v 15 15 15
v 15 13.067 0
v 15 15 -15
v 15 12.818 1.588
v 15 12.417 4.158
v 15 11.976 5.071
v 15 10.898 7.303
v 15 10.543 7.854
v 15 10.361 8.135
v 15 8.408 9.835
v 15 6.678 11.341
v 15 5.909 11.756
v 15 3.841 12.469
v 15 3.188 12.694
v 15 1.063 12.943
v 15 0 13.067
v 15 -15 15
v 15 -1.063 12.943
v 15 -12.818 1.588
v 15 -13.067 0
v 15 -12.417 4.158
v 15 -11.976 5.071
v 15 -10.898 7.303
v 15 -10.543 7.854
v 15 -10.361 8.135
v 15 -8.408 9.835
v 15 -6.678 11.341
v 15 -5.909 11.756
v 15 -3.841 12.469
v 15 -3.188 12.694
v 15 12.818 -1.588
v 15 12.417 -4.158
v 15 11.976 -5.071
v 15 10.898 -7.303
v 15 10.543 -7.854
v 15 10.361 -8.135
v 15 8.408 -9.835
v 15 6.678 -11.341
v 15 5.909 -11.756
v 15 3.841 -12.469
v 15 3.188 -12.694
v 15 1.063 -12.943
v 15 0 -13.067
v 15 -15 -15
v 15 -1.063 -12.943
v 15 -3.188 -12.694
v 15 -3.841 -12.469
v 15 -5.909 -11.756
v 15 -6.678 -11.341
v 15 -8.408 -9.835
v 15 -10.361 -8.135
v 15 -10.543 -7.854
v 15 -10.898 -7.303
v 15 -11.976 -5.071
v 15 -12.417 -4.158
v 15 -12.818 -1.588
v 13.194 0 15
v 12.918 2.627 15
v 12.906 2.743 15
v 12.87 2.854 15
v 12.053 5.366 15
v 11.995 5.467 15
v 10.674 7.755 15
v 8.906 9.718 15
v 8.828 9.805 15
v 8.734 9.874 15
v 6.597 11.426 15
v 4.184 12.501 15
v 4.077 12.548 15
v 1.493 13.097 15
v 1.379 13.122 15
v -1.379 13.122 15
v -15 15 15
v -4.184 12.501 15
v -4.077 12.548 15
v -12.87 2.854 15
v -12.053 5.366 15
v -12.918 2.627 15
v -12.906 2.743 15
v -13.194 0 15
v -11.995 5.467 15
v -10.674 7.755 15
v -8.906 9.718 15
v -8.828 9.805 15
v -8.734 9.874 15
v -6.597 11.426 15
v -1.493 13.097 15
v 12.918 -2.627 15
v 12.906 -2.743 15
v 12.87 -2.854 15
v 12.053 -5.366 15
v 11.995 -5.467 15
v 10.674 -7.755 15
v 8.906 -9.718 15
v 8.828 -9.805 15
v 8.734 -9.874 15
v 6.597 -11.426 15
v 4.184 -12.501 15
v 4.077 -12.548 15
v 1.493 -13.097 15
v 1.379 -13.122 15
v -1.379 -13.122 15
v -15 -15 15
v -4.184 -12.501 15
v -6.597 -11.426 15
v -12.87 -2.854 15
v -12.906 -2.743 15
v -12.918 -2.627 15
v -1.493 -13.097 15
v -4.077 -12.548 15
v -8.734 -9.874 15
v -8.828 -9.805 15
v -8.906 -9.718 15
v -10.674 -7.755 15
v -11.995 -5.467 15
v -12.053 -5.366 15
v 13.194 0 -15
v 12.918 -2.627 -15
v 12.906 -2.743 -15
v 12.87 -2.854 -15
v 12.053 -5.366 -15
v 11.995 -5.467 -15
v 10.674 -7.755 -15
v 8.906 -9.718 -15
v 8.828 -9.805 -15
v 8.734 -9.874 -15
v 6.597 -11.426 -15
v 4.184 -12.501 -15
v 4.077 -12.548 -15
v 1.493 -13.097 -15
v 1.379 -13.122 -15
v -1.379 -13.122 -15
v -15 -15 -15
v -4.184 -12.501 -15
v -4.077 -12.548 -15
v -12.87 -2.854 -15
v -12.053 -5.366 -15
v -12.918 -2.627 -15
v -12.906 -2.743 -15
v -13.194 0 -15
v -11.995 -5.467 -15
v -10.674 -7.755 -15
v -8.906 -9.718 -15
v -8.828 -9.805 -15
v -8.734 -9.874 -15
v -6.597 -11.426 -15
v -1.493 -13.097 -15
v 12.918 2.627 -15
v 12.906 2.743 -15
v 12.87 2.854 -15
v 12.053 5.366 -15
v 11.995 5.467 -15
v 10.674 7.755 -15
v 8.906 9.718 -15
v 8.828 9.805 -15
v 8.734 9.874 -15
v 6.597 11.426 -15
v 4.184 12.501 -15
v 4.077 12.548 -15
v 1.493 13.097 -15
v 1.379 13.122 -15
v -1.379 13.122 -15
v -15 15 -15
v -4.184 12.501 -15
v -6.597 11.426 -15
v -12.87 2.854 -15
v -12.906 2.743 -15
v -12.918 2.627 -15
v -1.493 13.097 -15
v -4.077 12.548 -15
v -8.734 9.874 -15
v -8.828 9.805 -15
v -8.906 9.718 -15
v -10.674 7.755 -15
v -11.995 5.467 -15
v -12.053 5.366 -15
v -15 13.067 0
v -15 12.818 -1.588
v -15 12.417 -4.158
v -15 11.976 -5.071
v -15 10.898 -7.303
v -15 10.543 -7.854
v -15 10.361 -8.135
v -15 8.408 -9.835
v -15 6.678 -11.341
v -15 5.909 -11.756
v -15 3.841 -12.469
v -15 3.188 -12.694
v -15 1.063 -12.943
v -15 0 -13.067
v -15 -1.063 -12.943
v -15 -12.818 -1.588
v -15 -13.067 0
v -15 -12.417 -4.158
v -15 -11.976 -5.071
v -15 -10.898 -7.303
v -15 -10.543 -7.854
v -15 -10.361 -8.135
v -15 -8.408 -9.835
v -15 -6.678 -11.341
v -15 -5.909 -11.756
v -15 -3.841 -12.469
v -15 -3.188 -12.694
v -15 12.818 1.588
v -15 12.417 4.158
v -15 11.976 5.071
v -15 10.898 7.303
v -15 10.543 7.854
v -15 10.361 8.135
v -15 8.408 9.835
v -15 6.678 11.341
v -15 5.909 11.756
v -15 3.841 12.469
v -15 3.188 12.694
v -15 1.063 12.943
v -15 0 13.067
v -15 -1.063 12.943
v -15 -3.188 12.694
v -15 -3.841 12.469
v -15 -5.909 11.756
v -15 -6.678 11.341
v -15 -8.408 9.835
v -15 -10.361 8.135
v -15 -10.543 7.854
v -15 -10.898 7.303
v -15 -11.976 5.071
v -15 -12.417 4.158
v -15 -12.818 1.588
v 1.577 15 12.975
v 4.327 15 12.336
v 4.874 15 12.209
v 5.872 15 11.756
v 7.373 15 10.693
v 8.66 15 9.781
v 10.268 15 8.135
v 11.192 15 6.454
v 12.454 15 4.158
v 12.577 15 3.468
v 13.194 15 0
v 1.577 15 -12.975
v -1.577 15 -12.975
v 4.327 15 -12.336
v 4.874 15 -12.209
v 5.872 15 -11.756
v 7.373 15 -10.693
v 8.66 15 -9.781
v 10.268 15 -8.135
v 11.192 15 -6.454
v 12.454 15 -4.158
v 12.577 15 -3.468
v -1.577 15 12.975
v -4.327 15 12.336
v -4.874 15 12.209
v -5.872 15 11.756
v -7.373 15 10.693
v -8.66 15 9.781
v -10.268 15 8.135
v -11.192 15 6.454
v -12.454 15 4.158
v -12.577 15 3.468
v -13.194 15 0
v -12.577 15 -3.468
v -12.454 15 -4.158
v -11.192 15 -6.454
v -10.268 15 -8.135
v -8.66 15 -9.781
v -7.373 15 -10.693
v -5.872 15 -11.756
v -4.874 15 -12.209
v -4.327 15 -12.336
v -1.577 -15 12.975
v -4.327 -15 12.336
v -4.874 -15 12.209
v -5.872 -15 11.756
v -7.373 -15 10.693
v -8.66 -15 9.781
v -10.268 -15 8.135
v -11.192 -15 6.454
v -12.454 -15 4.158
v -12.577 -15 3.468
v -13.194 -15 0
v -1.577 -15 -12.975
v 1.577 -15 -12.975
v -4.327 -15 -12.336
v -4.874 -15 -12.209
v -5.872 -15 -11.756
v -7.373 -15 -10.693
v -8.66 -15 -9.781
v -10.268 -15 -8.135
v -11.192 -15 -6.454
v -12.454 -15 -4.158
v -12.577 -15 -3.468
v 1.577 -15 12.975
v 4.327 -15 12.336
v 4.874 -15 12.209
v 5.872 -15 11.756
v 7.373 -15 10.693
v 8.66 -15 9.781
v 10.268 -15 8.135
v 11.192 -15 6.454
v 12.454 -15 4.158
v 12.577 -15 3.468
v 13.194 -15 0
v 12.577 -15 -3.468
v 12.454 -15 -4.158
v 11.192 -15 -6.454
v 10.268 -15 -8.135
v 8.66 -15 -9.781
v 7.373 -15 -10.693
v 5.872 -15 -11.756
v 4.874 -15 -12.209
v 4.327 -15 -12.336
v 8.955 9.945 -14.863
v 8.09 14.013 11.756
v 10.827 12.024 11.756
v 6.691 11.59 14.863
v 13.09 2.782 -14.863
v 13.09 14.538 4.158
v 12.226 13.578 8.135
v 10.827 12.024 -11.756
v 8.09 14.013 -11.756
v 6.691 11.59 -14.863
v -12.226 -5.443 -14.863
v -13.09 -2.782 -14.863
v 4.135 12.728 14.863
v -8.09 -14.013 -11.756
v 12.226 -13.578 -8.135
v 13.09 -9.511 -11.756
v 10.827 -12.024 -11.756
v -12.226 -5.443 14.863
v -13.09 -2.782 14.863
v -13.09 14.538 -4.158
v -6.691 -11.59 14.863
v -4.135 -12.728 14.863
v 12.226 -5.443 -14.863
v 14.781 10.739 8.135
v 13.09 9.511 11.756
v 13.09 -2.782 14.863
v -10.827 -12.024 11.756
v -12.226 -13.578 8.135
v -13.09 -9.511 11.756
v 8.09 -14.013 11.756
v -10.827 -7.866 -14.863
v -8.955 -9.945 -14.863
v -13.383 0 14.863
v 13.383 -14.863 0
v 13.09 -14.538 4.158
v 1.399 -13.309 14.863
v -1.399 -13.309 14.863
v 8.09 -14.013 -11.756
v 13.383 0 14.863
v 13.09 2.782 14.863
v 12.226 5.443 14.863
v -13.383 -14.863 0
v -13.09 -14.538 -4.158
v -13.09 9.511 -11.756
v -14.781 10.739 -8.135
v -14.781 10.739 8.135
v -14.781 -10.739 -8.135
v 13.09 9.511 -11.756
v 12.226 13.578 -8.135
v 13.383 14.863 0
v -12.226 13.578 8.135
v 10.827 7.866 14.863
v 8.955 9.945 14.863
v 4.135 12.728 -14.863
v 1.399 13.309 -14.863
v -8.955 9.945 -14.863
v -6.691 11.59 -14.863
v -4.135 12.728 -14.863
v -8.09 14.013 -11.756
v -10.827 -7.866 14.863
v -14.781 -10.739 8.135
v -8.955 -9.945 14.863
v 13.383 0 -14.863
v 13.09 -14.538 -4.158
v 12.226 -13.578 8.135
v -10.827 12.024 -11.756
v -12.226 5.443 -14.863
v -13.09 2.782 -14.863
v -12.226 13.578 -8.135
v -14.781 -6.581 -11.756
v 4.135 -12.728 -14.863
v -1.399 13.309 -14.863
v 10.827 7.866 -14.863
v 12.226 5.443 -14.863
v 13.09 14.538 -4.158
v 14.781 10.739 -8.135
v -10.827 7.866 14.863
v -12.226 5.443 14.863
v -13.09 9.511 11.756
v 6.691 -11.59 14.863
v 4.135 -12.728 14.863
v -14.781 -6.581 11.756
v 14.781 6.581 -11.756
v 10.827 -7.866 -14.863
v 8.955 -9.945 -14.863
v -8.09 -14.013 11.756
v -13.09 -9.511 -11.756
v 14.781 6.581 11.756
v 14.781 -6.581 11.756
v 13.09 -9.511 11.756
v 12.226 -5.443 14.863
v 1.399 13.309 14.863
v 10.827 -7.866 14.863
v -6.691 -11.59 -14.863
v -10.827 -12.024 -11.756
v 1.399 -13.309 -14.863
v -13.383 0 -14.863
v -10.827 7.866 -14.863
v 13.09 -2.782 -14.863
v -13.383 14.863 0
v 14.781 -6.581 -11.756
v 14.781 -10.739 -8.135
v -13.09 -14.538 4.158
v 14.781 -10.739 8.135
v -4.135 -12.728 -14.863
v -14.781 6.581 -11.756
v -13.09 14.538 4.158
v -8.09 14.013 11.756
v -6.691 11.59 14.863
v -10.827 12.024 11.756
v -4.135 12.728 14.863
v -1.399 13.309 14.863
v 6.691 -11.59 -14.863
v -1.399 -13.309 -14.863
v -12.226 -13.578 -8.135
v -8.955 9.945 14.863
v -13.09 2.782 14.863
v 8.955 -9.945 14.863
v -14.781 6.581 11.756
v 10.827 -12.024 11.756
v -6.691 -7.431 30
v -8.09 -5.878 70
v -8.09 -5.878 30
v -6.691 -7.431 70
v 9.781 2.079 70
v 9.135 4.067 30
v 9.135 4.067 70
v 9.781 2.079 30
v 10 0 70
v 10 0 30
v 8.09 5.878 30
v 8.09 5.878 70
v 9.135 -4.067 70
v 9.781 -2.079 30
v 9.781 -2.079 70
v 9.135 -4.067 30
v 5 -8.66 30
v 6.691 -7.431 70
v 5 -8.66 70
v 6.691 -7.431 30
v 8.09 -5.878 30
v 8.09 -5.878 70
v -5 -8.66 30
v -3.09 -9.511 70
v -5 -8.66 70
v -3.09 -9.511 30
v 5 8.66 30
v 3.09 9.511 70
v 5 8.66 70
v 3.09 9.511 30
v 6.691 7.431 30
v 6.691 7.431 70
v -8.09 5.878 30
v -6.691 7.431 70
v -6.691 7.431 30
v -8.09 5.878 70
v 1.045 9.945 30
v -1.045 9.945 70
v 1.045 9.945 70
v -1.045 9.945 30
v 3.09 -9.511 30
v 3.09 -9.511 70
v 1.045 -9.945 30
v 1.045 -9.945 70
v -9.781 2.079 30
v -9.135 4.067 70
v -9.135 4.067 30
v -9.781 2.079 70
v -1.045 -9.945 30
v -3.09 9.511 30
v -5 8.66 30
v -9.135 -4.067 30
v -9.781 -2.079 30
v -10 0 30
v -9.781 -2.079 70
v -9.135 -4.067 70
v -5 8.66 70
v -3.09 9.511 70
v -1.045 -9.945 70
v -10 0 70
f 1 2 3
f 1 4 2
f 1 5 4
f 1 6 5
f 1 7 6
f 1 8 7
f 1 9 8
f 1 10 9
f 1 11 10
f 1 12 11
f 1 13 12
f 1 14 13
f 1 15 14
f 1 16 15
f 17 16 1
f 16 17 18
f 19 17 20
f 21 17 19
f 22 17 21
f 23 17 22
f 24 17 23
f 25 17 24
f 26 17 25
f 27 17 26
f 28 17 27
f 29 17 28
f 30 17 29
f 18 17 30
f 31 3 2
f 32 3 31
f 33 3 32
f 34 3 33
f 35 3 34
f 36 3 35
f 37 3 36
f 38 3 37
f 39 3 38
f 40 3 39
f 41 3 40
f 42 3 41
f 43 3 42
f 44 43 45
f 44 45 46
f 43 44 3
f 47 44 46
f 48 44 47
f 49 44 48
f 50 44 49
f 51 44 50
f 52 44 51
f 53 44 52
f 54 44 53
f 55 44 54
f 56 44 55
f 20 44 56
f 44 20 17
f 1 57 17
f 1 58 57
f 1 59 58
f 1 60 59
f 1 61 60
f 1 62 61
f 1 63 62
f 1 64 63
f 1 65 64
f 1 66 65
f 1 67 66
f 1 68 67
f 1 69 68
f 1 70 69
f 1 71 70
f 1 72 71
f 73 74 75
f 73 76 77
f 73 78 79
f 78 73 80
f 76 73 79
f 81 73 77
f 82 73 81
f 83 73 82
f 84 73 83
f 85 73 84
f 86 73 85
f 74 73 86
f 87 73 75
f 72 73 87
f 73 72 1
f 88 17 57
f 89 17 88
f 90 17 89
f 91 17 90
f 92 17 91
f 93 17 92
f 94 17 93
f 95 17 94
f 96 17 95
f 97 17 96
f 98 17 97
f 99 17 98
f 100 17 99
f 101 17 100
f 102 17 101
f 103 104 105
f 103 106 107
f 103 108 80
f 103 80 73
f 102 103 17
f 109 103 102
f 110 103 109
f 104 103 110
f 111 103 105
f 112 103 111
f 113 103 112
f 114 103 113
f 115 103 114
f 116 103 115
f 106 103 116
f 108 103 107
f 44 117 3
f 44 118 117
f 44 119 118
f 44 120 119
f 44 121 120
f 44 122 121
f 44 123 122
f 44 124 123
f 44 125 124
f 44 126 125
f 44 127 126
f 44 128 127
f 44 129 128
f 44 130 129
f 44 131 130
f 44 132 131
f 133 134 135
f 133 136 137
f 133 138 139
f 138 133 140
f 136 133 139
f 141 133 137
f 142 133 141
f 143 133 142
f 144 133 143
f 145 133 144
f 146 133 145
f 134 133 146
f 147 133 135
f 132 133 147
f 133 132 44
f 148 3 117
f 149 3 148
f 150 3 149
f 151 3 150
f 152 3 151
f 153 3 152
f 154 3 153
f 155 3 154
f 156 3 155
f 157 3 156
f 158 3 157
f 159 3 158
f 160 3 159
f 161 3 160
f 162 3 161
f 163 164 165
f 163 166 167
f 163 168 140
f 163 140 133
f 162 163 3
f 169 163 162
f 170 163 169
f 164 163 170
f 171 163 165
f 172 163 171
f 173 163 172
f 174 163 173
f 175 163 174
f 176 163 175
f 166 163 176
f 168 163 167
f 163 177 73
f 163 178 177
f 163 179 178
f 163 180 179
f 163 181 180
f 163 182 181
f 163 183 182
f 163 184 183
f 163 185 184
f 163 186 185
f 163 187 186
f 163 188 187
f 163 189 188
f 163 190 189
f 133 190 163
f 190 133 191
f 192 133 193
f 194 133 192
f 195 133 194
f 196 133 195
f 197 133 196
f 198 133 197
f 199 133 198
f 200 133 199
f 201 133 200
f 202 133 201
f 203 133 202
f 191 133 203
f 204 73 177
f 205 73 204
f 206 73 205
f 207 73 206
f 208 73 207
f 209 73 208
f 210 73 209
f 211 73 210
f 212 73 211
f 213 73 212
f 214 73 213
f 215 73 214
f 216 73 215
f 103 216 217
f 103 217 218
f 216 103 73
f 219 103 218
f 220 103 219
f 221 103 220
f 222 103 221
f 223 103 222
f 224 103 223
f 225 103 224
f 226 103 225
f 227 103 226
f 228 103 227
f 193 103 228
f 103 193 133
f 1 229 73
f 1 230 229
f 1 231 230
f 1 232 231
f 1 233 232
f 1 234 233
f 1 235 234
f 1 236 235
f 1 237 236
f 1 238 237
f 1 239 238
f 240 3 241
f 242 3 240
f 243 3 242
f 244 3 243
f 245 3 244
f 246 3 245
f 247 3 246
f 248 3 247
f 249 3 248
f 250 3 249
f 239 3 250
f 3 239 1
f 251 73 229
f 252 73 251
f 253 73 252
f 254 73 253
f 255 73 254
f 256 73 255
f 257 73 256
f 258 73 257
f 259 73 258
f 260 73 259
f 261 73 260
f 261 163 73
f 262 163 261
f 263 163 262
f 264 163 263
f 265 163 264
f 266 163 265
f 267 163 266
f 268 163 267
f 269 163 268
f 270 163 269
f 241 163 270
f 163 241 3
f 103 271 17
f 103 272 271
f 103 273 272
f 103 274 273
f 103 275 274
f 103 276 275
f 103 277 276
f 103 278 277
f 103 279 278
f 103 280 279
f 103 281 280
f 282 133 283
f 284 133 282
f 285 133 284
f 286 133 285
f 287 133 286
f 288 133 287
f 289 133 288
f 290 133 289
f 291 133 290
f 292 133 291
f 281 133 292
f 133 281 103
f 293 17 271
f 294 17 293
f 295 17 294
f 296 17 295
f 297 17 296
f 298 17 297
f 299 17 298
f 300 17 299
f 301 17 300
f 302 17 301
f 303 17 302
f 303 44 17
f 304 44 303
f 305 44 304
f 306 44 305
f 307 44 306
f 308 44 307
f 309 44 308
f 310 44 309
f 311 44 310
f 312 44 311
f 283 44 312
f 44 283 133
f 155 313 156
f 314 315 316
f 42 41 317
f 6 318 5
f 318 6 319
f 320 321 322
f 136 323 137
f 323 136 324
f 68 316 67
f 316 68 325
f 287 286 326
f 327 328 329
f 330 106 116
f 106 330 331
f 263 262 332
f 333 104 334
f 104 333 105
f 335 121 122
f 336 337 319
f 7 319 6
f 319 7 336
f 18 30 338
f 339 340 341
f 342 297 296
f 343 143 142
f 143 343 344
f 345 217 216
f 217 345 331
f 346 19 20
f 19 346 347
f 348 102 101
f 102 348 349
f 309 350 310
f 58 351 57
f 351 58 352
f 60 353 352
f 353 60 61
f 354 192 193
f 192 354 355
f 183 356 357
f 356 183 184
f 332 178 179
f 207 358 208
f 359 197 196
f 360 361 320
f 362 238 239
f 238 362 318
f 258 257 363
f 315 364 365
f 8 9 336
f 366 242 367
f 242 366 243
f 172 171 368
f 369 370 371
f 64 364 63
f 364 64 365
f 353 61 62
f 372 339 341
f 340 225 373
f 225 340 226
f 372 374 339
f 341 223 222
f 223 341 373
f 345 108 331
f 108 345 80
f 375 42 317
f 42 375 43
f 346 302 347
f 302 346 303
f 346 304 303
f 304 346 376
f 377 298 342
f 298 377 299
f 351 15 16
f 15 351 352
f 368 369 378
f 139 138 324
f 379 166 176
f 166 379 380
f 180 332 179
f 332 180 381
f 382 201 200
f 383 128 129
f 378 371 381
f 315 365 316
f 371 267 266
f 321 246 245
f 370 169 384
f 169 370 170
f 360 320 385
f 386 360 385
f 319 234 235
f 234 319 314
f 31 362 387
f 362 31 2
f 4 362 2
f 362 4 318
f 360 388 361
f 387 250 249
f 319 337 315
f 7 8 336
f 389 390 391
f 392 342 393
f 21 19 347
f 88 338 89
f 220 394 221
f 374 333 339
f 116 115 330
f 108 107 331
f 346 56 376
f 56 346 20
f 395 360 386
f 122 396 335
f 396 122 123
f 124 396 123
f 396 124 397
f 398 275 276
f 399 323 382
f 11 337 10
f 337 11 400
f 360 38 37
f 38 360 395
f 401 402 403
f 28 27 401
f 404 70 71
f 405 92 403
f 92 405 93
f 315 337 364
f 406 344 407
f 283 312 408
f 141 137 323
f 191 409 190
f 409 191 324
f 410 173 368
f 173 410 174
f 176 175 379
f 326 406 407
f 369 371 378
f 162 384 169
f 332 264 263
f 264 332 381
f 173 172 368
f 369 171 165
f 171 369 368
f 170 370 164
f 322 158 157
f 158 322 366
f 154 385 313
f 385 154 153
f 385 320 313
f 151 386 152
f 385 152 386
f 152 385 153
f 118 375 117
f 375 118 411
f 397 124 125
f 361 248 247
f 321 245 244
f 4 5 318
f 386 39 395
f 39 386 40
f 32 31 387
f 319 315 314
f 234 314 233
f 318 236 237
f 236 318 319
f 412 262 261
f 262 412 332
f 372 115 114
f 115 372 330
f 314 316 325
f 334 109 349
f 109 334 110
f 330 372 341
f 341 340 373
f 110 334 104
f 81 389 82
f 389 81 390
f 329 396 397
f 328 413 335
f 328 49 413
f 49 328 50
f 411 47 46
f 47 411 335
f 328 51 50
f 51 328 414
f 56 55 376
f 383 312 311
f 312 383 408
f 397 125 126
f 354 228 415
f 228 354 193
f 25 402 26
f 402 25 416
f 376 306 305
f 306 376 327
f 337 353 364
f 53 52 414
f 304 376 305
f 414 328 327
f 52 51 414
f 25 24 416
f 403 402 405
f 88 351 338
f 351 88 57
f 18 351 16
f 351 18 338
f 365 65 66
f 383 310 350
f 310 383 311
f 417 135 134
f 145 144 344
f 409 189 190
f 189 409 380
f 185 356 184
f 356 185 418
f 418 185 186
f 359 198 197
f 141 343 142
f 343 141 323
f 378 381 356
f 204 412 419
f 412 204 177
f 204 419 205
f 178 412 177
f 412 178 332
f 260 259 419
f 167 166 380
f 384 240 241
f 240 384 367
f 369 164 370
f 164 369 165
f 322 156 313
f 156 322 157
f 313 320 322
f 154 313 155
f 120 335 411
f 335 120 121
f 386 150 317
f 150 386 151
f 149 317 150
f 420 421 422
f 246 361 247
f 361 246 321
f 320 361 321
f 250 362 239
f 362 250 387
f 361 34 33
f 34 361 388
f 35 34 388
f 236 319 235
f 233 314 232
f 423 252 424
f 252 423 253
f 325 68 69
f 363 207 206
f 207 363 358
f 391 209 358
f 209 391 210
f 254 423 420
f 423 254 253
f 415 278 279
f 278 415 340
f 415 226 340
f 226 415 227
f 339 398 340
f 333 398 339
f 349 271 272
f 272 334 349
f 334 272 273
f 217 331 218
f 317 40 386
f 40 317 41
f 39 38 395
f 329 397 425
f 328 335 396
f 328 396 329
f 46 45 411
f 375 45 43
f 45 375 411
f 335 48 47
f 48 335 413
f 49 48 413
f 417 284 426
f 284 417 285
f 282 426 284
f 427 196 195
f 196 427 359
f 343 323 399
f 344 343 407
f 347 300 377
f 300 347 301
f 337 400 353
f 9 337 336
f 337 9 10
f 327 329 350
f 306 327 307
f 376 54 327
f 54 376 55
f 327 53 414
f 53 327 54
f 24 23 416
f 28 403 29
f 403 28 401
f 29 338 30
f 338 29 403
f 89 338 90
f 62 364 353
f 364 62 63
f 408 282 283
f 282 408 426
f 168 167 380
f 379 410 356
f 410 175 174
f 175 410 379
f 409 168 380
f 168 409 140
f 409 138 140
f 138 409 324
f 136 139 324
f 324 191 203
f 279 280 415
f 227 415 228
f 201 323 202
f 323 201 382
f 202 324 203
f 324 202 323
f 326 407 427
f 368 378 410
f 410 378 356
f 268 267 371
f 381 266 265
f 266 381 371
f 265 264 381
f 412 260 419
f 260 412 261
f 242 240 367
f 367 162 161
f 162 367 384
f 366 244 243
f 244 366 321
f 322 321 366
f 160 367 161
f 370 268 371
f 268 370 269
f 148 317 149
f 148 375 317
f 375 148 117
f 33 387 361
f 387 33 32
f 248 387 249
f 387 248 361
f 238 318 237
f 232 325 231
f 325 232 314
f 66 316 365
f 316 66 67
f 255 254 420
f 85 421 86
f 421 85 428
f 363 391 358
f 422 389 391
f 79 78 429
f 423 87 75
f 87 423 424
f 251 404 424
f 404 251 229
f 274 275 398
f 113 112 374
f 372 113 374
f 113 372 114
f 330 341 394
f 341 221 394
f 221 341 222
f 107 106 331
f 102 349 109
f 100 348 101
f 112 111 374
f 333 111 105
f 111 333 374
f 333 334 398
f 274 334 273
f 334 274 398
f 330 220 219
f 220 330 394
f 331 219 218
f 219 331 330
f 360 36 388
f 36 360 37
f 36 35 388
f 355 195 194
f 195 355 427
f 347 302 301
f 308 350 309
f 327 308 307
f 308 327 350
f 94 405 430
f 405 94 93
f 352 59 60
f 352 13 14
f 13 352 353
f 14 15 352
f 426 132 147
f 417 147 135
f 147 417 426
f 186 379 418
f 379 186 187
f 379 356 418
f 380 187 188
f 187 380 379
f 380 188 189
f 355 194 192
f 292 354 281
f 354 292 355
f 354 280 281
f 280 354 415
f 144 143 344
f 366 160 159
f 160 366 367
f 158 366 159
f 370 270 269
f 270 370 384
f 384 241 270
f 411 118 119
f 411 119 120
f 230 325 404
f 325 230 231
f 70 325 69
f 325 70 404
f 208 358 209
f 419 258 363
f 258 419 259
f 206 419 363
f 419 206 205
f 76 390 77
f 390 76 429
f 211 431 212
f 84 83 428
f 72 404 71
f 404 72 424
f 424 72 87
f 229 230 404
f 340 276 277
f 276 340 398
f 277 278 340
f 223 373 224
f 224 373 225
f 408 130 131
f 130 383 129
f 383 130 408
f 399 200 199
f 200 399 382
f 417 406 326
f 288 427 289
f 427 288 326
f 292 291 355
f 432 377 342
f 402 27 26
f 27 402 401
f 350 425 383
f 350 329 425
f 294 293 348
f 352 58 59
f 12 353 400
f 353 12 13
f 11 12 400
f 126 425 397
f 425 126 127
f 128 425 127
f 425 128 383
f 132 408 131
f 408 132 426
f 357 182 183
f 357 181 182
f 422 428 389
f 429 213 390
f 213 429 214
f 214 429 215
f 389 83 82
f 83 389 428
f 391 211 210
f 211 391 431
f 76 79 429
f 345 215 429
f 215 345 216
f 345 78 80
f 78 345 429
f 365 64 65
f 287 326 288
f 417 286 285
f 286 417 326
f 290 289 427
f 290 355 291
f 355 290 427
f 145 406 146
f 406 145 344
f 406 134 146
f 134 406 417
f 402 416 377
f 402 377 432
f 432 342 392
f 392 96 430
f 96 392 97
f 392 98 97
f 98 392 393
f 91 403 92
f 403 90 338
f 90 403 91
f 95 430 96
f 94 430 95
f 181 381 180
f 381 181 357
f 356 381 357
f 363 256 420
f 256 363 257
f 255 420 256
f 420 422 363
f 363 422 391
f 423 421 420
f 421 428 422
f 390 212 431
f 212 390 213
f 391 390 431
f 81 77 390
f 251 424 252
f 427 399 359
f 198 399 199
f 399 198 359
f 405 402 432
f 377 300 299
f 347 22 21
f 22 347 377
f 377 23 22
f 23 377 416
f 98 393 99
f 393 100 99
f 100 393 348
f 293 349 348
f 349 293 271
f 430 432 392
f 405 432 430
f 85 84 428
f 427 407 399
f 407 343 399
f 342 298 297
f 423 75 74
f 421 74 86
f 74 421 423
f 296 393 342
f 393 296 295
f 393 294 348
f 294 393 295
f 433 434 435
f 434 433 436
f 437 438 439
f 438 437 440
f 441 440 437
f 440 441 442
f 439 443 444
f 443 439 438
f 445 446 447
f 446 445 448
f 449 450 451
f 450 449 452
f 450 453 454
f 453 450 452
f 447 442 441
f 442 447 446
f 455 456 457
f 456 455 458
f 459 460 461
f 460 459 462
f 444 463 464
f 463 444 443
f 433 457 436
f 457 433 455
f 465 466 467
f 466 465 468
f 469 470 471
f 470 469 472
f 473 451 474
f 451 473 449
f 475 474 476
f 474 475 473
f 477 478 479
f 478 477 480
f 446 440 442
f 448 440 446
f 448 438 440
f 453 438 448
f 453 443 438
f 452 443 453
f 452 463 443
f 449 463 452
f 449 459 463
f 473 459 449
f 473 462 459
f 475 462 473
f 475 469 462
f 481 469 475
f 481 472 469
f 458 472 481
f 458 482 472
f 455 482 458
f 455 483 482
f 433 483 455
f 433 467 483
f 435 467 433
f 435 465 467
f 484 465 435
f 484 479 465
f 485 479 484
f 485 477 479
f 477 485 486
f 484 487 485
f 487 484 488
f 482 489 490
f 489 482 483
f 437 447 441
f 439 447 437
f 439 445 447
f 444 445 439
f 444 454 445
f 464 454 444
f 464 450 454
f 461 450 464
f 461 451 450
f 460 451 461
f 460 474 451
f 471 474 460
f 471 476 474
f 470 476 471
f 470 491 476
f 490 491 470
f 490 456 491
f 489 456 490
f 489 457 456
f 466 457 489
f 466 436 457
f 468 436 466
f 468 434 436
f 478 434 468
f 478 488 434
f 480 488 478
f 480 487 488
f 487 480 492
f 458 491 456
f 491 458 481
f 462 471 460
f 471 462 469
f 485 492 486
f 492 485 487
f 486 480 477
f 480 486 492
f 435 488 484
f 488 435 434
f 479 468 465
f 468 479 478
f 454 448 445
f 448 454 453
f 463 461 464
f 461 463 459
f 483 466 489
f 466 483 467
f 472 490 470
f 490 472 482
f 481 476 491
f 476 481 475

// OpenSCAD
//cube([2,3,4]); //comment?

difference() {
	cube(30, center=true);
	sphere(20                             );
	}

translate([0, 0, 30]){
	cylinder(h=40, r=10);
	}
